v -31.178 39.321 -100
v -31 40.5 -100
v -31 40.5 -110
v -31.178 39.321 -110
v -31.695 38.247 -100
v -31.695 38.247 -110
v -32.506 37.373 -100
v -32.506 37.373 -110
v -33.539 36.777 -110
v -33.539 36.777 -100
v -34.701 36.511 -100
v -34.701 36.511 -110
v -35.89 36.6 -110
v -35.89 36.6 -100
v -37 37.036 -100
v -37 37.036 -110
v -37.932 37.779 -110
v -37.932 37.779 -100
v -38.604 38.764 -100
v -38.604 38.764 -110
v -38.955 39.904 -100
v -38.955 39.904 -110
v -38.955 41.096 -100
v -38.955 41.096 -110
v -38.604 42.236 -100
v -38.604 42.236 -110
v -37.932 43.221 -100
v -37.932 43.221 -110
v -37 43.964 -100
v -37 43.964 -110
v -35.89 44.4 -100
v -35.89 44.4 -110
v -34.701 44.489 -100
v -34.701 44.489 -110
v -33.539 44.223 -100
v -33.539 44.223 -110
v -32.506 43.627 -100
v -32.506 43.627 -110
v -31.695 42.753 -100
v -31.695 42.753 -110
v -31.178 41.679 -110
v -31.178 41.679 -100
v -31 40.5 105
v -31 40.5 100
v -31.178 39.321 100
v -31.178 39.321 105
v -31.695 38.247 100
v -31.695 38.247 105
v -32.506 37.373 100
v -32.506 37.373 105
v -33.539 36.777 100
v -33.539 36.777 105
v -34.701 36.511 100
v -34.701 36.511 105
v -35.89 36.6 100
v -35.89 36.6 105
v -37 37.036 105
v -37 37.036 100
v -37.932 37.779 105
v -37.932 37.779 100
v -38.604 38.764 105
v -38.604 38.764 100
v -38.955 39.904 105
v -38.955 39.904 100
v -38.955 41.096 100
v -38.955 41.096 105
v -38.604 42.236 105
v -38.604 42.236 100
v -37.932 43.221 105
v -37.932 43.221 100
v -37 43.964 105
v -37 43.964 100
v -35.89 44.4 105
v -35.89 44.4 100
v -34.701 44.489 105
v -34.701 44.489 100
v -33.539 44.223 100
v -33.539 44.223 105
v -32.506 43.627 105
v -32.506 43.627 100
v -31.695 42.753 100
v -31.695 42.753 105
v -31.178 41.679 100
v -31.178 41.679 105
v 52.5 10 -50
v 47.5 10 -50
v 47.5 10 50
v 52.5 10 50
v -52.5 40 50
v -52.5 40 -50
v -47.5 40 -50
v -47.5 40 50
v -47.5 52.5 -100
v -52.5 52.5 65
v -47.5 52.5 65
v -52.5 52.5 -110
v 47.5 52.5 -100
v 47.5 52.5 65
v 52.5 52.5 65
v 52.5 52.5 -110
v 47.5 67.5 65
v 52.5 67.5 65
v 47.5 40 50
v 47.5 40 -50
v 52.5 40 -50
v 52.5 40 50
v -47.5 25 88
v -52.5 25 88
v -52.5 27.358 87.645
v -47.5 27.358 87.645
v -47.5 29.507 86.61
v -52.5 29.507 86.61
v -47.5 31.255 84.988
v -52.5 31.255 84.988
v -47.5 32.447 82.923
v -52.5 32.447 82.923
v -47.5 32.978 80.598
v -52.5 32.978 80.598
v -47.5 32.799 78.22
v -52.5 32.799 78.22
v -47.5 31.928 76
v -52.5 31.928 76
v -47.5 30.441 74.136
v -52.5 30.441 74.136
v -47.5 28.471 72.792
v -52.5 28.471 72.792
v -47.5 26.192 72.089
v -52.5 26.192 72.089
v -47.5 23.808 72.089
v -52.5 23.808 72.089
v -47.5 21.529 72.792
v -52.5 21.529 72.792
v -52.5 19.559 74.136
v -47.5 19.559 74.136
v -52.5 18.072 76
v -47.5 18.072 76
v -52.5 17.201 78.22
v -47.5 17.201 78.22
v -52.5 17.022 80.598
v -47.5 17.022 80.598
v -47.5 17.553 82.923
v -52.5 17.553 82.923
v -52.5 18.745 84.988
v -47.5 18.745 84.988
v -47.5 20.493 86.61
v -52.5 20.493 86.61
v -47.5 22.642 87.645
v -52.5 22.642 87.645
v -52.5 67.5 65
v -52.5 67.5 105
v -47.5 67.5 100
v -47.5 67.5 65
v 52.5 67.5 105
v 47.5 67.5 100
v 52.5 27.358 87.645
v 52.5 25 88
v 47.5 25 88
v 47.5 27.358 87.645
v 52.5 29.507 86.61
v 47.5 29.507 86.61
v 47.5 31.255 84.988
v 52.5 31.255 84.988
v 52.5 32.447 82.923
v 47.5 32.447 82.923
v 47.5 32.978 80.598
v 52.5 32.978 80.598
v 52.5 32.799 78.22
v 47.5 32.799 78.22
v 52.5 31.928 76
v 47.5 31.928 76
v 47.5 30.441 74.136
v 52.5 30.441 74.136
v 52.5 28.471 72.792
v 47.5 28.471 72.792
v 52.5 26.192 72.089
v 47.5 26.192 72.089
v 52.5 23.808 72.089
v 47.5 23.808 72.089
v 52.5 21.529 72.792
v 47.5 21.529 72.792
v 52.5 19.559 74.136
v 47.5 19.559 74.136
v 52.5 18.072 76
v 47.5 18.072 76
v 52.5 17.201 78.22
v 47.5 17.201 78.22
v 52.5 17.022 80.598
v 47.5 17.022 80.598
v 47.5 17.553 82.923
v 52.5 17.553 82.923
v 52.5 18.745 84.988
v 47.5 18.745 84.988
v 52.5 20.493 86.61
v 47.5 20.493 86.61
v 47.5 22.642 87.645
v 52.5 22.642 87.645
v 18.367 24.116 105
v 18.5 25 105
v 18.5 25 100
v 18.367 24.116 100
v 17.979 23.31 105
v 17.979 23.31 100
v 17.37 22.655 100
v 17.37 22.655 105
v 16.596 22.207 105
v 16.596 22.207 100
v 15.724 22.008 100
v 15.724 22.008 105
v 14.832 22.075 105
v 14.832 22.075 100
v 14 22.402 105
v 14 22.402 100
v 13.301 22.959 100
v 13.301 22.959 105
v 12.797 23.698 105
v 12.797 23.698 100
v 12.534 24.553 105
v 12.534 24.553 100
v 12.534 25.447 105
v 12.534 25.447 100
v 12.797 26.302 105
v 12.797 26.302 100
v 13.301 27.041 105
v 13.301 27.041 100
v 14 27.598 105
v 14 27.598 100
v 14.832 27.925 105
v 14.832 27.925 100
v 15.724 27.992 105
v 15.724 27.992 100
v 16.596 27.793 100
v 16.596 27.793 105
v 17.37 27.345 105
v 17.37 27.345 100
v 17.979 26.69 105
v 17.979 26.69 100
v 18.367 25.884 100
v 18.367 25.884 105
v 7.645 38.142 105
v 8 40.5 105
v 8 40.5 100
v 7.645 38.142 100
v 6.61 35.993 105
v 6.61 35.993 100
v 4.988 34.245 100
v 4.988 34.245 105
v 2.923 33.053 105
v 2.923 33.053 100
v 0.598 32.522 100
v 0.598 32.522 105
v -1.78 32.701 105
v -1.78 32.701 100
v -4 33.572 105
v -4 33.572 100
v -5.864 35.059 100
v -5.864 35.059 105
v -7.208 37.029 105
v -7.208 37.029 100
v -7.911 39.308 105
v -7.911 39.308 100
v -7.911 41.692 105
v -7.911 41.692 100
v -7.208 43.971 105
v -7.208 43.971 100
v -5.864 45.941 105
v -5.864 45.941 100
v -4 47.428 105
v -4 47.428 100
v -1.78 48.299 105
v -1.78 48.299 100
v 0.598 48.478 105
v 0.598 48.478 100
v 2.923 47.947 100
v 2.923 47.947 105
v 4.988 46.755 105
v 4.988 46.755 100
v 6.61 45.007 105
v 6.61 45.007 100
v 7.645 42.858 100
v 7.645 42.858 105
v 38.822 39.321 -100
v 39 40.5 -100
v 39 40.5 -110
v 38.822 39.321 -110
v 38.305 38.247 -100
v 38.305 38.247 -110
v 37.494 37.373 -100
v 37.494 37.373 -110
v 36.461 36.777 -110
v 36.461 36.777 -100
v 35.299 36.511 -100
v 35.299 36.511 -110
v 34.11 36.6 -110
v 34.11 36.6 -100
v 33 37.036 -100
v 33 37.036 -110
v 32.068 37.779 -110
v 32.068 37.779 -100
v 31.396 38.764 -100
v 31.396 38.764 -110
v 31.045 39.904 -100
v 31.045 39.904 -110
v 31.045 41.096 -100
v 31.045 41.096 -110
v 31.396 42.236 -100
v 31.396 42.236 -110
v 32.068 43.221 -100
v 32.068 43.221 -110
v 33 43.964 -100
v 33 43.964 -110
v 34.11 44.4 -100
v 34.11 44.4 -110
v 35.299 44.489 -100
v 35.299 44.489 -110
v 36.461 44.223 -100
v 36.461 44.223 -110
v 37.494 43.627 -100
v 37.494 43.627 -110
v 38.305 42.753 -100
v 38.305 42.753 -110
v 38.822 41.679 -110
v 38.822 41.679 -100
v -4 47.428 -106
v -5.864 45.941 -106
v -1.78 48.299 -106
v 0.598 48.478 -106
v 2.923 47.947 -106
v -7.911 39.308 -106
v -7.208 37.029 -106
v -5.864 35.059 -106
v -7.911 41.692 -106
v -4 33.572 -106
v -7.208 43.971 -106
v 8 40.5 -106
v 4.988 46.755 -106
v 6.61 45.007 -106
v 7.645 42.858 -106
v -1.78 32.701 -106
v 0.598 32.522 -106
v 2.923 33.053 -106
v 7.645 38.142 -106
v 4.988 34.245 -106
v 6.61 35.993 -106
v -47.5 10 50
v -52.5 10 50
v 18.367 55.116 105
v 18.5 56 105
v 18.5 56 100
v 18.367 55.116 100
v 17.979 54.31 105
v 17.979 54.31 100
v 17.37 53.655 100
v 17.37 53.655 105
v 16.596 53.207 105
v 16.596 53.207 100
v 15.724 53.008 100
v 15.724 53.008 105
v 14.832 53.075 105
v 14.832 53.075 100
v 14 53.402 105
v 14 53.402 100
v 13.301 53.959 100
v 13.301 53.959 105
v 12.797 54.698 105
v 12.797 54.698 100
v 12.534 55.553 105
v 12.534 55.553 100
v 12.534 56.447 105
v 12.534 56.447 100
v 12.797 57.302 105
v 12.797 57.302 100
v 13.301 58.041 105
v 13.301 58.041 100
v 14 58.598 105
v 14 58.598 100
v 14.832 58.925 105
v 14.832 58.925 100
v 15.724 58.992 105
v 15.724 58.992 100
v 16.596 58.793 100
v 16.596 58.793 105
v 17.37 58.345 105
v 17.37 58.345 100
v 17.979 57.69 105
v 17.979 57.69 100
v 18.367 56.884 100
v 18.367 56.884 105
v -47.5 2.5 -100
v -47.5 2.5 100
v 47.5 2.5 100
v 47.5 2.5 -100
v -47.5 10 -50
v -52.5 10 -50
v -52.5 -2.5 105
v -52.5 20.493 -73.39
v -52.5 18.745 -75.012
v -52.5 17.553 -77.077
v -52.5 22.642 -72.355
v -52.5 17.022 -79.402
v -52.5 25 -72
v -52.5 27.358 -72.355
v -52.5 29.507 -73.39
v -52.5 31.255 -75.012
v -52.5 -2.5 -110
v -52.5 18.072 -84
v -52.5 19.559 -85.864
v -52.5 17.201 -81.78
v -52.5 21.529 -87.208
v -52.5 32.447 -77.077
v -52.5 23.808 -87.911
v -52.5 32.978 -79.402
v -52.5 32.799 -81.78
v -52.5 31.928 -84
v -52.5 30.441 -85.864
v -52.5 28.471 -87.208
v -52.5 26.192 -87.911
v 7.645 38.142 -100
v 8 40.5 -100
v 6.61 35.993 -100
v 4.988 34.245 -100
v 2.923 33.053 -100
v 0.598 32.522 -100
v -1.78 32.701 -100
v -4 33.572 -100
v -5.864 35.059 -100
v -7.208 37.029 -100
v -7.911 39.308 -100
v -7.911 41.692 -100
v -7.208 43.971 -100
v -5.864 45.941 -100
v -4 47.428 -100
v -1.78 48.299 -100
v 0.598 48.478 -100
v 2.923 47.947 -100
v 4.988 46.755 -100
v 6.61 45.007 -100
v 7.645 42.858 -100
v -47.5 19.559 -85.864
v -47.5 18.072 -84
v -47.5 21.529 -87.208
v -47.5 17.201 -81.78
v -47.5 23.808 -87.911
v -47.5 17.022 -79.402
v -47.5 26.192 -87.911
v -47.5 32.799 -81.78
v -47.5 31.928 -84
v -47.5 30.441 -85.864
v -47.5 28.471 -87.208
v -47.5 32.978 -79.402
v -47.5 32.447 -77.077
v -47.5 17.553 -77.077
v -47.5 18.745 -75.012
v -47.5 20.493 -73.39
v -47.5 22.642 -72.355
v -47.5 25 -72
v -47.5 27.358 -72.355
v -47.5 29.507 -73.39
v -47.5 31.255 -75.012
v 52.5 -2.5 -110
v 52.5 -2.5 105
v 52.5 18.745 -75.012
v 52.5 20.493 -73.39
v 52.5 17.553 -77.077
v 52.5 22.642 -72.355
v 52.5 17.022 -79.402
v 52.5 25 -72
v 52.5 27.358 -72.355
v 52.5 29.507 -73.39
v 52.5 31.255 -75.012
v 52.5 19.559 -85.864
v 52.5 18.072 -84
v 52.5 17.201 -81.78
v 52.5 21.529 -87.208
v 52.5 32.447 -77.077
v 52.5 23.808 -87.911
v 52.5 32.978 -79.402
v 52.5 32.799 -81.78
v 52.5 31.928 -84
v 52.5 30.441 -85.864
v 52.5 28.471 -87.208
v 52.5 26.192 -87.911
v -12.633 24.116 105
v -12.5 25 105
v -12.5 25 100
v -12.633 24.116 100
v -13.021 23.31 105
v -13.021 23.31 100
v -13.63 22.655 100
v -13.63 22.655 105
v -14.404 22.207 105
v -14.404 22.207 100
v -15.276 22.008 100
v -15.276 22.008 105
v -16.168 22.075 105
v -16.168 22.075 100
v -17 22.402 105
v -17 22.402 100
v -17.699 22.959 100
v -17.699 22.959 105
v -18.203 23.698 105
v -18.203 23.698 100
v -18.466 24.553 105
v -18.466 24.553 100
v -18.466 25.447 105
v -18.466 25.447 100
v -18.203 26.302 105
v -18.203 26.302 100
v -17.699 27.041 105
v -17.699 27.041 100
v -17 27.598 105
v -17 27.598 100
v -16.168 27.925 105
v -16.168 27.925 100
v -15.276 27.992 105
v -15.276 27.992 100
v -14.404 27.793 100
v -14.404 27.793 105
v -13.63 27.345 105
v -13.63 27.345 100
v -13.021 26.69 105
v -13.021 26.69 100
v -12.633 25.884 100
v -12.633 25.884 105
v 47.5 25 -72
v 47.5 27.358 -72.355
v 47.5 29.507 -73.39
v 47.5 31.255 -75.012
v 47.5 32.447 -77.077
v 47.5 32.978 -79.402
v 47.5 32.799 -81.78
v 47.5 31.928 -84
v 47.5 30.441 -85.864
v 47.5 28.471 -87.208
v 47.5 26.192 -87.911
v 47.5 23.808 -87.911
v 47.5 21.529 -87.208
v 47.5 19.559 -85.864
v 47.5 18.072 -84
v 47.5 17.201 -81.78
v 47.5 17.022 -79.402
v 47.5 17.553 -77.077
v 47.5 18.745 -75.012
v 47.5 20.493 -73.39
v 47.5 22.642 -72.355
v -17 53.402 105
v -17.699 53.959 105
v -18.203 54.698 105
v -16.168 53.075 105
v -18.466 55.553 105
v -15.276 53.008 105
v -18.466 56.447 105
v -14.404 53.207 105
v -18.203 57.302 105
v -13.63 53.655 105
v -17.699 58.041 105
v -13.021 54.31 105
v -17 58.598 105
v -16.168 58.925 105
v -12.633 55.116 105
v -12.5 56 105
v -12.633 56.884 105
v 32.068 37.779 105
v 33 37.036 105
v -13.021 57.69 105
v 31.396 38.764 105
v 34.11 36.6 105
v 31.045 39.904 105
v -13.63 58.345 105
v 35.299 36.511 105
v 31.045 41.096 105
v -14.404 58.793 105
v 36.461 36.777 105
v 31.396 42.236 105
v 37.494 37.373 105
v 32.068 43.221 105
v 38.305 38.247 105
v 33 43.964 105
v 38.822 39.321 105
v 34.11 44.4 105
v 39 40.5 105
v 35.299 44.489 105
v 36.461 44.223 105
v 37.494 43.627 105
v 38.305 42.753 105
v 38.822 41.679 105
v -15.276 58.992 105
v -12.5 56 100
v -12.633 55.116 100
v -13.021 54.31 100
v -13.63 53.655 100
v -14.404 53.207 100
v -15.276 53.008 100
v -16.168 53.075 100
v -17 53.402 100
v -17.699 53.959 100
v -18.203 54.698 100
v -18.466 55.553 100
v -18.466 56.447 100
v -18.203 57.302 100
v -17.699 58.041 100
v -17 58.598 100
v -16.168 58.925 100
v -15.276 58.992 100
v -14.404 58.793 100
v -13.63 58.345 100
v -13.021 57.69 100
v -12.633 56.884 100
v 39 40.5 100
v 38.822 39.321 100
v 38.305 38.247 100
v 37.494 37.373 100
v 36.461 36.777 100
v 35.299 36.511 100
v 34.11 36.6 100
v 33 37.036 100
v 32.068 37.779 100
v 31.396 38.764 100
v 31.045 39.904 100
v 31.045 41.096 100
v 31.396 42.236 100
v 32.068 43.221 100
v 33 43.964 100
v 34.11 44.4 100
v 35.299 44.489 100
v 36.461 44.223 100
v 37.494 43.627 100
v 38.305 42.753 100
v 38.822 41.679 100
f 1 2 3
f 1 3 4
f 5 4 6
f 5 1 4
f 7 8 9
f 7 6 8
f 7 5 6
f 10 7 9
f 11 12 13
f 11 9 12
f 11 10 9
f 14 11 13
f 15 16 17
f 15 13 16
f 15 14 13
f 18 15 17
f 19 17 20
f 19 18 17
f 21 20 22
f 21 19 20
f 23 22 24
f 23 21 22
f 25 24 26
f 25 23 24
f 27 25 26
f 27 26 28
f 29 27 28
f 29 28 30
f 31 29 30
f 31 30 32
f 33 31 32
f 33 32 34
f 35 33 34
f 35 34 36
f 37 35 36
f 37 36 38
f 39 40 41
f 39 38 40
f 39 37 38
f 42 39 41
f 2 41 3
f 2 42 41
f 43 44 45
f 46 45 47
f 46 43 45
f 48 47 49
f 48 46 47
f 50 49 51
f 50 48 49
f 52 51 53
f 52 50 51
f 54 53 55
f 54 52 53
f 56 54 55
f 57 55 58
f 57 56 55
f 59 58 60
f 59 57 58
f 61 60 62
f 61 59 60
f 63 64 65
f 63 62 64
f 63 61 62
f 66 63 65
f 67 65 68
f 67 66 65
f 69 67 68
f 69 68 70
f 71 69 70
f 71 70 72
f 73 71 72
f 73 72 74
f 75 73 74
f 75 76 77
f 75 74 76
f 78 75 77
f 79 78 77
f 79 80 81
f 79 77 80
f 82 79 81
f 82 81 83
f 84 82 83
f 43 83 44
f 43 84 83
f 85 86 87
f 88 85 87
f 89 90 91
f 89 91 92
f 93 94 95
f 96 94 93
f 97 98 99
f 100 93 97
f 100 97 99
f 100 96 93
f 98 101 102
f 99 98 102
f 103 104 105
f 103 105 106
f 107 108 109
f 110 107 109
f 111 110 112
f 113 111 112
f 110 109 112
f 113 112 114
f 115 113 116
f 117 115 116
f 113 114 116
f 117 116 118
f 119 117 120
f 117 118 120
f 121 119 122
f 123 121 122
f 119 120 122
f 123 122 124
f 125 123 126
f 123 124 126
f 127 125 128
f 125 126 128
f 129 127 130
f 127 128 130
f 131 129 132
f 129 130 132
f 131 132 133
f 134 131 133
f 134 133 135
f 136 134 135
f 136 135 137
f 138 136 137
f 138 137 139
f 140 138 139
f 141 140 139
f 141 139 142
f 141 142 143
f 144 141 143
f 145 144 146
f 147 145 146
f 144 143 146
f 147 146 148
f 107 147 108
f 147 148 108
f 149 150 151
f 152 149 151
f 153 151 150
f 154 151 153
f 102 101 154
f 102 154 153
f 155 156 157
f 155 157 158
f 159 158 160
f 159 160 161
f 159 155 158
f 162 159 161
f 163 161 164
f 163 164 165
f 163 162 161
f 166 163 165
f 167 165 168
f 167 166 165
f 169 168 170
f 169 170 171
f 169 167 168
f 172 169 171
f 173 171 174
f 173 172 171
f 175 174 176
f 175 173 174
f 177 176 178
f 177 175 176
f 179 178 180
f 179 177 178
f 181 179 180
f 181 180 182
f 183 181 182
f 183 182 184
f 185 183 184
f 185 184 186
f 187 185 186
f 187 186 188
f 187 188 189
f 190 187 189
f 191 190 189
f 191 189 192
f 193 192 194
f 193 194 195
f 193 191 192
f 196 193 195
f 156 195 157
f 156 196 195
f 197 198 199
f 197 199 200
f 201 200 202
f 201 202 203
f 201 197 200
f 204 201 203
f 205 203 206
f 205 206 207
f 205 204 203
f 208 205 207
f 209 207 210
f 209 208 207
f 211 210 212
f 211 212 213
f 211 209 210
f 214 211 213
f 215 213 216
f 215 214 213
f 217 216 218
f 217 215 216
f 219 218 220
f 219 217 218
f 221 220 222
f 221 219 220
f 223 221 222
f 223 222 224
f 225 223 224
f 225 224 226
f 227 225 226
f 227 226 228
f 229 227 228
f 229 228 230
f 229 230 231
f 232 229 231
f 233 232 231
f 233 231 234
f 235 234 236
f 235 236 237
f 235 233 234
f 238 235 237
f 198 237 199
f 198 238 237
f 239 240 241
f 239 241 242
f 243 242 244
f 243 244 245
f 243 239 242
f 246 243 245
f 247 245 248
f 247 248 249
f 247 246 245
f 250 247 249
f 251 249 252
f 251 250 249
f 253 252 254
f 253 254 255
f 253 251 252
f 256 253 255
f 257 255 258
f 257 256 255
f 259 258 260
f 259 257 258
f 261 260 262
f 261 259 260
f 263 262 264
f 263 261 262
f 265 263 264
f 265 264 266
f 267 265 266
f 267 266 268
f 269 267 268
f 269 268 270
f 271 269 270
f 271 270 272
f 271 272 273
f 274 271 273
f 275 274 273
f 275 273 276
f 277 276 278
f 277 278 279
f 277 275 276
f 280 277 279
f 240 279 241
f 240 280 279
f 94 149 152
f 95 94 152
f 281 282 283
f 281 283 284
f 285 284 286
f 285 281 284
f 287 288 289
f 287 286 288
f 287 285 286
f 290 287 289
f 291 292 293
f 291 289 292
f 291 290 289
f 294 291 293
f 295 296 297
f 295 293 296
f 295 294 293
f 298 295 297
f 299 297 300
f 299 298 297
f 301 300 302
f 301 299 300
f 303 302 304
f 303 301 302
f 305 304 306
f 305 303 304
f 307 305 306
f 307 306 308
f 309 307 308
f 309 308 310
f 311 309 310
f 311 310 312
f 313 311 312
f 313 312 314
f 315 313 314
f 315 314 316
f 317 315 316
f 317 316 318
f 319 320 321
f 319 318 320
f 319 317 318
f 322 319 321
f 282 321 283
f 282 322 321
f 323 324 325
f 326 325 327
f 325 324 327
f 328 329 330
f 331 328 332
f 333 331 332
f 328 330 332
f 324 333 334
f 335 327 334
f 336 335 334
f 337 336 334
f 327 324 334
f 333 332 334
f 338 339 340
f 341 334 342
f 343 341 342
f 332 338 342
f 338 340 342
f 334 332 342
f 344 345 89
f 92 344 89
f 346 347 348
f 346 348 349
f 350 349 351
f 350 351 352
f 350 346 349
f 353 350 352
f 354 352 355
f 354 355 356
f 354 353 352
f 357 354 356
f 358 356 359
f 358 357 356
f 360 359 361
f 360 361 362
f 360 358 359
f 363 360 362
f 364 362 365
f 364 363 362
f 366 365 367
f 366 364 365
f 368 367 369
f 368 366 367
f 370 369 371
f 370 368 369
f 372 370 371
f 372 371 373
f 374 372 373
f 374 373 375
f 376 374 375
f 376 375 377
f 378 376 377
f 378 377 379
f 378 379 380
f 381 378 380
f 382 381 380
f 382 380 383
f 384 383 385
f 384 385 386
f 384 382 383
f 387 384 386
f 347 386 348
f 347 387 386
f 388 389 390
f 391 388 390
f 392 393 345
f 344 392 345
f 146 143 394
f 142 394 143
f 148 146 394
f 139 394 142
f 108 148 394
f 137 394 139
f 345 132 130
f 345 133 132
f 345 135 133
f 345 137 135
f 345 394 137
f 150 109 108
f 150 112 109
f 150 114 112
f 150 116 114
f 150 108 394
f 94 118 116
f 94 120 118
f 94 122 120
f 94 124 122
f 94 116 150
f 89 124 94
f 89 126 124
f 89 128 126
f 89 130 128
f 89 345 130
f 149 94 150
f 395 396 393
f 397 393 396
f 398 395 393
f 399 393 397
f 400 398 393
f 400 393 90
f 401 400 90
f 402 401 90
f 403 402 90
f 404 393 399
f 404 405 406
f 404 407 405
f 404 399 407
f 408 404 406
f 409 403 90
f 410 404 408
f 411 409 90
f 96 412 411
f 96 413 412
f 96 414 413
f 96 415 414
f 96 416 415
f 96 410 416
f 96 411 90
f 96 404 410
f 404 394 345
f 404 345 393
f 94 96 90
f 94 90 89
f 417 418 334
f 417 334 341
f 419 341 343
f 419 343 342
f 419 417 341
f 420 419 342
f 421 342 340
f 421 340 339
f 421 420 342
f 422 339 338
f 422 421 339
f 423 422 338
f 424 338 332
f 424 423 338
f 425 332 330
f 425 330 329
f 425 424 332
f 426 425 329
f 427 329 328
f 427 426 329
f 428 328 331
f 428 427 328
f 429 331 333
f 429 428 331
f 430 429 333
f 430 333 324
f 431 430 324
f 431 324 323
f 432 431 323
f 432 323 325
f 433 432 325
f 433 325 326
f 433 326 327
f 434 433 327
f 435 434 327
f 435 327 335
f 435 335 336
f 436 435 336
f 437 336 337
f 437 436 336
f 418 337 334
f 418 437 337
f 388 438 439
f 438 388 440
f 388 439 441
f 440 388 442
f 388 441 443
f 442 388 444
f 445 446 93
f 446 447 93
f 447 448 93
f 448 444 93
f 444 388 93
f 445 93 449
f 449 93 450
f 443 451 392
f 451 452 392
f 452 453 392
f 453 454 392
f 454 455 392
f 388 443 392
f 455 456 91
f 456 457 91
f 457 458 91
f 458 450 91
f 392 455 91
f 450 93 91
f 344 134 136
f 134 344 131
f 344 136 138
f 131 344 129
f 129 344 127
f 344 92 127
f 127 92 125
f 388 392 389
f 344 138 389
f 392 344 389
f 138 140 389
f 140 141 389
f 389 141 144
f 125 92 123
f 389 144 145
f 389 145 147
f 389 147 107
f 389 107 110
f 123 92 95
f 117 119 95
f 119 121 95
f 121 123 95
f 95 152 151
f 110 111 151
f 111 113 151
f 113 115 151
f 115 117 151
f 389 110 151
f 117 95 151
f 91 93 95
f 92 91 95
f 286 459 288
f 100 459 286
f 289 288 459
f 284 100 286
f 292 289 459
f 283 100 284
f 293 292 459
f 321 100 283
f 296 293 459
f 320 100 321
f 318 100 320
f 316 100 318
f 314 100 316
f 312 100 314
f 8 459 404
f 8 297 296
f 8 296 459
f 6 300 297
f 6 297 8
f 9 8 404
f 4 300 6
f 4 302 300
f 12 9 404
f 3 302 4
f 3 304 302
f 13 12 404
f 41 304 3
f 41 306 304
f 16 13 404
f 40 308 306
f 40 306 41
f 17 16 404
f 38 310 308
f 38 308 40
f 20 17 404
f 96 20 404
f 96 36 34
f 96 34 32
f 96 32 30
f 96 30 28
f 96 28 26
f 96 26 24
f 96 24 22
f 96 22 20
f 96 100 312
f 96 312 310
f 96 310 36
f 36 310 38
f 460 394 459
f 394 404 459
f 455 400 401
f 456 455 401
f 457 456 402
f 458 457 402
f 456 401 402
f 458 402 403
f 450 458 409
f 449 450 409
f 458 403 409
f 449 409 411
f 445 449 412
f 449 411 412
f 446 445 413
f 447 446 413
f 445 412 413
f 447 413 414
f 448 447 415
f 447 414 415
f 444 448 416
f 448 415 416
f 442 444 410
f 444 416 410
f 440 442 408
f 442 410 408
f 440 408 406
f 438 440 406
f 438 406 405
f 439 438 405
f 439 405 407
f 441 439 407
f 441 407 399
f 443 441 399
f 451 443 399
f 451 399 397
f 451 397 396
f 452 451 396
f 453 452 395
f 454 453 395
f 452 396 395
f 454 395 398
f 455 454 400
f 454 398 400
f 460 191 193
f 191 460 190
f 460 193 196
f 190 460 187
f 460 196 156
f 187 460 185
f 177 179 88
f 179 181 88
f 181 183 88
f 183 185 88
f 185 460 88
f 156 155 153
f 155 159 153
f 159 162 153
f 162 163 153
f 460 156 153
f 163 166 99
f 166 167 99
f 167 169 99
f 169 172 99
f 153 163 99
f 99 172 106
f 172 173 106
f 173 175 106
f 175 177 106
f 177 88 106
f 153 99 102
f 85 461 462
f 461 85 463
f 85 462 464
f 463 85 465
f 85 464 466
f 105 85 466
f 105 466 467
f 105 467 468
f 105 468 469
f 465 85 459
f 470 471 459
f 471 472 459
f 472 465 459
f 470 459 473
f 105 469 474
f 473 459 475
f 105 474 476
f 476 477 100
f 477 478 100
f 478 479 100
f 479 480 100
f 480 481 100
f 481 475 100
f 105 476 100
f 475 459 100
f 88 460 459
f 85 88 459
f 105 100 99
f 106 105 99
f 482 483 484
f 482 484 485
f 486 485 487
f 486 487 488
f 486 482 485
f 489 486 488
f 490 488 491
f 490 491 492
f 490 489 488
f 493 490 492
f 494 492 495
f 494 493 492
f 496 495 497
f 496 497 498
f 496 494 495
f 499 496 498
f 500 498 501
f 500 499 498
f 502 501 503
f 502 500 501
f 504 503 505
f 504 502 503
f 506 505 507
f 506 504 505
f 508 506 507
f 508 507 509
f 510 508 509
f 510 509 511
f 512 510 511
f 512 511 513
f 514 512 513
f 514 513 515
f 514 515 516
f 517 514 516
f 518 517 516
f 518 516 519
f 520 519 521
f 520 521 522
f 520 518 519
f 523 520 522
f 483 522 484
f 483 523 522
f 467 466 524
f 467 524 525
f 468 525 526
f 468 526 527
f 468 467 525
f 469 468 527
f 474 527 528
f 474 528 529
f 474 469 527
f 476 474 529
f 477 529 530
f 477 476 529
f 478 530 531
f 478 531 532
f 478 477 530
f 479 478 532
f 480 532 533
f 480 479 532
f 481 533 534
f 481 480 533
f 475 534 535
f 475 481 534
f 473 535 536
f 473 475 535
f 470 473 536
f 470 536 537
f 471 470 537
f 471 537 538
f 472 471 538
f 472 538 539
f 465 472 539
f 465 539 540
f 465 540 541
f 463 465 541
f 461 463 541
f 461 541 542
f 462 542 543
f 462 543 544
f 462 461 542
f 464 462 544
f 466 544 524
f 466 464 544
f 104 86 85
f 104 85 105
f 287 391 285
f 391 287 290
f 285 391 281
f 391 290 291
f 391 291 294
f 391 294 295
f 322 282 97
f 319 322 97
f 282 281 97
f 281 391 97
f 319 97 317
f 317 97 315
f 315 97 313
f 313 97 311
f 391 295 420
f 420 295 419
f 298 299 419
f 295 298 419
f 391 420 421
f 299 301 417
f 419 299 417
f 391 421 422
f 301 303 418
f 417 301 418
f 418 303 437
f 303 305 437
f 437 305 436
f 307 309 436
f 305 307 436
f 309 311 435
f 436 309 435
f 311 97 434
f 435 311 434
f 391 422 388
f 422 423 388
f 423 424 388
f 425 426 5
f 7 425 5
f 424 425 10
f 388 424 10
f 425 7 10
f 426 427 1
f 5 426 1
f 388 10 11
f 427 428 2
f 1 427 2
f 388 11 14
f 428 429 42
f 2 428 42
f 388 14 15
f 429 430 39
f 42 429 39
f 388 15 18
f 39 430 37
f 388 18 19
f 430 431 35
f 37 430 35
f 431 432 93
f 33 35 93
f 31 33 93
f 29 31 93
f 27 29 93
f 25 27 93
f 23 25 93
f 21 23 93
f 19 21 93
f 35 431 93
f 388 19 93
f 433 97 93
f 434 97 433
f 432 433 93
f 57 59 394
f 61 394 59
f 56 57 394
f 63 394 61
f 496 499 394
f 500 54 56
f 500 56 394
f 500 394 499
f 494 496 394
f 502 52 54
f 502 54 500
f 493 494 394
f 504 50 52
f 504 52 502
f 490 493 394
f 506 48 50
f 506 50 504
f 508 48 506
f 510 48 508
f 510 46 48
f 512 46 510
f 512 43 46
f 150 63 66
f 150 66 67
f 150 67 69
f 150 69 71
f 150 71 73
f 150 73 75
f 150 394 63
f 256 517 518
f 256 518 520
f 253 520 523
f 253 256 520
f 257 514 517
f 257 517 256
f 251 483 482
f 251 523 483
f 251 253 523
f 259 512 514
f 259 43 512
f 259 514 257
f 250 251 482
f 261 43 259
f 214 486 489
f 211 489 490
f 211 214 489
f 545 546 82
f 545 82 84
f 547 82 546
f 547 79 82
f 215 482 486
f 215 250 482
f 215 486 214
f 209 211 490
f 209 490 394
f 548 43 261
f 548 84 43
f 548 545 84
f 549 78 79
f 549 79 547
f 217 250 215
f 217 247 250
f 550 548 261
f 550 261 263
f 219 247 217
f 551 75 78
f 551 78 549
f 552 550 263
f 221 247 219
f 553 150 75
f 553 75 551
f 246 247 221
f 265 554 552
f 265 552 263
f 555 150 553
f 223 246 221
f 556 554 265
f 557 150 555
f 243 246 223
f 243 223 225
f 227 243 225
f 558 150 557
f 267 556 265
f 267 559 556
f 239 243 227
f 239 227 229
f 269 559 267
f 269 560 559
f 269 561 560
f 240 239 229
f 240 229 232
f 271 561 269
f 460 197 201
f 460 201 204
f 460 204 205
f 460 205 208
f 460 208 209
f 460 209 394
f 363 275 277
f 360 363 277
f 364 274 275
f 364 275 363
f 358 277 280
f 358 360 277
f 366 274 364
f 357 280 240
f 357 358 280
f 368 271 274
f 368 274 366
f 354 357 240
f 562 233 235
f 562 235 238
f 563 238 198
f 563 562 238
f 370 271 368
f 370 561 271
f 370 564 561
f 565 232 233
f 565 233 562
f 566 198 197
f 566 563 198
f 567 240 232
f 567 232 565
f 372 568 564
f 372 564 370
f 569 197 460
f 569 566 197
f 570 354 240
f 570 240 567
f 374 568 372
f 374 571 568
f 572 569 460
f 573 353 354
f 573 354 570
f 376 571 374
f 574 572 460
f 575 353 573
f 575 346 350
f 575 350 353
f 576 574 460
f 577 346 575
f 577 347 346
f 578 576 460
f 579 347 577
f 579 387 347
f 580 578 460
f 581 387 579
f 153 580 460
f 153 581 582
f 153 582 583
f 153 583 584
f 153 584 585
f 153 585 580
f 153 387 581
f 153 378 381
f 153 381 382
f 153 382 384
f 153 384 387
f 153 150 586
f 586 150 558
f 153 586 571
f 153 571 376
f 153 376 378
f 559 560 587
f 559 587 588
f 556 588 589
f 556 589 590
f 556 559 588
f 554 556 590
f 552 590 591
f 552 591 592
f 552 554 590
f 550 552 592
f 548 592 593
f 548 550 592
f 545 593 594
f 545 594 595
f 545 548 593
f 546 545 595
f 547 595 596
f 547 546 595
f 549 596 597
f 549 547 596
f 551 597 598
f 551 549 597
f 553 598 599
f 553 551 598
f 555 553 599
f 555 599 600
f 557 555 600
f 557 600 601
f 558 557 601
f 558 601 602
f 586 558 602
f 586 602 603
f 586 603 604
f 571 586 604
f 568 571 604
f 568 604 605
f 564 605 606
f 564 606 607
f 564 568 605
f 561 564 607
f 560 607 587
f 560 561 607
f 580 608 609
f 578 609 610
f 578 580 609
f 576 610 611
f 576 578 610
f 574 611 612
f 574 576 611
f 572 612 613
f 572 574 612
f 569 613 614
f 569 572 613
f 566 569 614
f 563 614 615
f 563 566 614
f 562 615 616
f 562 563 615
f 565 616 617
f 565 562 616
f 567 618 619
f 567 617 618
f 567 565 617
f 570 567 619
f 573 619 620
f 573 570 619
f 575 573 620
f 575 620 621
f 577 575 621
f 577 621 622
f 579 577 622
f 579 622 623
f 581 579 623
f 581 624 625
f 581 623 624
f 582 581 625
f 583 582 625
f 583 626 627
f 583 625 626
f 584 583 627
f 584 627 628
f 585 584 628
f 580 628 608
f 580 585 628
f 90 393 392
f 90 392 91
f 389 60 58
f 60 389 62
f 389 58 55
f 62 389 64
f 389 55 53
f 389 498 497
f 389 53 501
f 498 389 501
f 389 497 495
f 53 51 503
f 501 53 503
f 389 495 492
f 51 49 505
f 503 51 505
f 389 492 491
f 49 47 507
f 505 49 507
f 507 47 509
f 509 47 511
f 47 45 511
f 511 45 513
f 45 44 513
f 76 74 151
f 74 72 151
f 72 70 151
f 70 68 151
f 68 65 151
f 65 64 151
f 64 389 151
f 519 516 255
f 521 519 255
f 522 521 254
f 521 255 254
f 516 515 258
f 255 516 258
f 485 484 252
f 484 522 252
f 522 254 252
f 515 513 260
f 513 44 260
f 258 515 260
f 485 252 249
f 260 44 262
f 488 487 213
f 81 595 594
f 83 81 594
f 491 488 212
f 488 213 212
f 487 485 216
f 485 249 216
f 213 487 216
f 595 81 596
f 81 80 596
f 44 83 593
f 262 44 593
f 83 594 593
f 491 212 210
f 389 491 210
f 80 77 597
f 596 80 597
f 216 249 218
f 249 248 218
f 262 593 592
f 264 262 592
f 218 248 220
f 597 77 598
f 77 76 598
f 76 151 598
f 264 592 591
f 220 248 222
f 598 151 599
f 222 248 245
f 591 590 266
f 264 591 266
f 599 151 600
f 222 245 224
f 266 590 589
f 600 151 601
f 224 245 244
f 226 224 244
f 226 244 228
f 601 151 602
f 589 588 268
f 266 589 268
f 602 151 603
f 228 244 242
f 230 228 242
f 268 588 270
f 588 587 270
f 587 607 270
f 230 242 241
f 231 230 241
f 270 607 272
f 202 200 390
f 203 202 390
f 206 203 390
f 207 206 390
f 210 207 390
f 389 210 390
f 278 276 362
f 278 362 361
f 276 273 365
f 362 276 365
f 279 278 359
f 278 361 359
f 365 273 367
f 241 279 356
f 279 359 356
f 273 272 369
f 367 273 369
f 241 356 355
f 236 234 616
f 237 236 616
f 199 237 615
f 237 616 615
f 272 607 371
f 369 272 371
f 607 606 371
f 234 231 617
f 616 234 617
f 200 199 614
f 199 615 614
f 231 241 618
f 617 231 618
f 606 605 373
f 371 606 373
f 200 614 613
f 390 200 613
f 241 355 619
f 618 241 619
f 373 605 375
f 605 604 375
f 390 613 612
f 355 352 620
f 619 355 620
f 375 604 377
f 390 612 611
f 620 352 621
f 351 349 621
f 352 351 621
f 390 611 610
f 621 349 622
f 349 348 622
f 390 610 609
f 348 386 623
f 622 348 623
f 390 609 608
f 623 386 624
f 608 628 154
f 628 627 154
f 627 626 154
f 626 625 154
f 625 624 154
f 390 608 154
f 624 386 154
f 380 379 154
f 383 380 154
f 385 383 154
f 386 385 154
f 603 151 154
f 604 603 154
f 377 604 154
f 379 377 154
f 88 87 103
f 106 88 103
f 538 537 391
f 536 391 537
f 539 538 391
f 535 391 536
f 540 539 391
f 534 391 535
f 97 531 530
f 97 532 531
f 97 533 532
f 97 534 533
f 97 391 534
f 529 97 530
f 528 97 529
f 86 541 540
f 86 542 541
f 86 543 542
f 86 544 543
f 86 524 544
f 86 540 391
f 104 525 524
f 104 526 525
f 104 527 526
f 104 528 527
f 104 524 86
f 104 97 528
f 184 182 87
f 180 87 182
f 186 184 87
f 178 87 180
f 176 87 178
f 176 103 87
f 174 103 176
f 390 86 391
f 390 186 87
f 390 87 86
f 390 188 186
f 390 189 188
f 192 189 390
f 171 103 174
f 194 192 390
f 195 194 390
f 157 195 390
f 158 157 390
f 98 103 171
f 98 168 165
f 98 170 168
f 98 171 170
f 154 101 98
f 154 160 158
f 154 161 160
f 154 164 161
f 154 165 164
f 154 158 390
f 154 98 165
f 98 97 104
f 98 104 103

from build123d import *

# Parameters (mm, degrees)
SKETCH1_W           = 100
SKETCH1_H           = 200
BOSS_EXTRUDE1_DEPTH = 2.5
SKETCH2_W           = 200
SKETCH2_H           = 70
BOSS_EXTRUDE2_DEPTH = 2.5
SKETCH3_R           = 8
CUT_EXTRUDE1_DEPTH  = 5
SKETCH4_W           = 105
SKETCH4_H           = 70
BOSS_EXTRUDE3_DEPTH = 10
SKETCH5_W           = 105
SKETCH5_H           = 70
BOSS_EXTRUDE4_DEPTH = 5
SKETCH6_W           = 100
SKETCH6_H           = 30
CUT_EXTRUDE2_DEPTH  = 167.37683132
SKETCH7_R           = 4
CUT_EXTRUDE5_DEPTH  = 232.381719243
SKETCH7_5_R         = 3
SKETCH7_5_R_2       = 8
CUT_EXTRUDE6_DEPTH  = 5
SKETCH8_R           = 8
CUT_EXTRUDE7_DEPTH  = 6
SKETCH9_W           = 105
SKETCH9_H           = 175
CUT_EXTRUDE8_DEPTH  = 15


with BuildPart() as part:
    # Sketch1 → Boss-Extrude1 (new, symmetric)
    with BuildSketch(Plane(origin=(0, 0, 0), x_dir=(1, 0, 0), z_dir=(0, 1, 0))):
        Rectangle(SKETCH1_W, SKETCH1_H)
    extrude(amount=BOSS_EXTRUDE1_DEPTH, both=True)

    # Sketch2 → Boss-Extrude2 (add, symmetric)
    with BuildSketch(Plane.ZY.offset(50)):
        with Locations((0, 32.5)):
            Rectangle(SKETCH2_W, SKETCH2_H)
    boss_extrude2 = extrude(amount=BOSS_EXTRUDE2_DEPTH, both=True)

    # Sketch3 → Cut-Extrude1 (cut)
    with BuildSketch(Plane.ZY.offset(52.5)):
        with Locations((-80, 25)):
            Circle(SKETCH3_R)
        with Locations((80, 25)):
            Circle(SKETCH3_R)
    cut_extrude1 = extrude(amount=-CUT_EXTRUDE1_DEPTH, mode=Mode.SUBTRACT)

    # Mirror1: Boss-Extrude2, Cut-Extrude1 across plane
    add(boss_extrude2.mirror(Plane(origin=(0, 0, 0), x_dir=(0, 0, 1), z_dir=(1, 0, 0))))
    add(cut_extrude1.mirror(Plane(origin=(0, 0, 0), x_dir=(0, 0, 1), z_dir=(1, 0, 0))), mode=Mode.SUBTRACT)

    # Sketch4 → Boss-Extrude3 (add)
    with BuildSketch(Plane(origin=(0, 0, -100), x_dir=(-1, 0, 0), z_dir=(0, 0, -1))):
        with Locations((0, 32.5)):
            Rectangle(SKETCH4_W, SKETCH4_H)
    extrude(amount=BOSS_EXTRUDE3_DEPTH)

    # Sketch5 → Boss-Extrude4 (add)
    with BuildSketch(Plane.XY.offset(100)):
        with Locations((0, 32.5)):
            Rectangle(SKETCH5_W, SKETCH5_H)
    extrude(amount=BOSS_EXTRUDE4_DEPTH)

    # Sketch6 → Cut-Extrude2 (cut, through all)
    with BuildSketch(Plane.ZY.offset(52.5)):
        with Locations((0, 25)):
            Rectangle(SKETCH6_W, SKETCH6_H)
    extrude(amount=-CUT_EXTRUDE2_DEPTH, mode=Mode.SUBTRACT)

    # Sketch7 → Cut-Extrude5 (cut, through all)
    with BuildSketch(Plane(origin=(0, 0, 105), x_dir=(-1, 0, 0), z_dir=(0, 0, -1))):
        with Locations(Location((35, 40.5, 0), (0, 0, 180))):
            Circle(SKETCH7_R)
        with Locations(Location((-35, 40.5, 0), (0, 0, 180))):
            Circle(SKETCH7_R)
    extrude(amount=CUT_EXTRUDE5_DEPTH, mode=Mode.SUBTRACT)

    # Sketch7<5> → Cut-Extrude6 (cut)
    with BuildSketch(Plane(origin=(0, 0, 105), x_dir=(-1, 0, 0), z_dir=(0, 0, -1))):
        with Locations(Location((15.5, 56, 0), (0, 0, 180))):
            Circle(SKETCH7_5_R)
        with Locations(Location((-15.5, 56, 0), (0, 0, 180))):
            Circle(SKETCH7_5_R)
        with Locations(Location((15.5, 25, 0), (0, 0, 180))):
            Circle(SKETCH7_5_R)
        with Locations(Location((-15.5, 25, 0), (0, 0, 180))):
            Circle(SKETCH7_5_R)
        with Locations(Location((0, 40.5, 0), (0, 0, 180))):
            Circle(SKETCH7_5_R_2)
    extrude(amount=CUT_EXTRUDE6_DEPTH, mode=Mode.SUBTRACT)

    # Sketch8 → Cut-Extrude7 (cut)
    with BuildSketch(Plane(origin=(0, 0, -100), x_dir=(-1, 0, 0), z_dir=(0, 0, -1))):
        with Locations(Location((0, 40.5, 0), (0, 0, 180))):
            Circle(SKETCH8_R)
    extrude(amount=CUT_EXTRUDE7_DEPTH, mode=Mode.SUBTRACT)

    # Sketch9 → Cut-Extrude8 (cut)
    with BuildSketch(Plane(origin=(0, 67.5, 0), x_dir=(1, 0, 0), z_dir=(0, 1, 0))):
        with Locations((0, 22.5)):
            Rectangle(SKETCH9_W, SKETCH9_H)
    extrude(amount=-CUT_EXTRUDE8_DEPTH, mode=Mode.SUBTRACT)


solid = part.part
